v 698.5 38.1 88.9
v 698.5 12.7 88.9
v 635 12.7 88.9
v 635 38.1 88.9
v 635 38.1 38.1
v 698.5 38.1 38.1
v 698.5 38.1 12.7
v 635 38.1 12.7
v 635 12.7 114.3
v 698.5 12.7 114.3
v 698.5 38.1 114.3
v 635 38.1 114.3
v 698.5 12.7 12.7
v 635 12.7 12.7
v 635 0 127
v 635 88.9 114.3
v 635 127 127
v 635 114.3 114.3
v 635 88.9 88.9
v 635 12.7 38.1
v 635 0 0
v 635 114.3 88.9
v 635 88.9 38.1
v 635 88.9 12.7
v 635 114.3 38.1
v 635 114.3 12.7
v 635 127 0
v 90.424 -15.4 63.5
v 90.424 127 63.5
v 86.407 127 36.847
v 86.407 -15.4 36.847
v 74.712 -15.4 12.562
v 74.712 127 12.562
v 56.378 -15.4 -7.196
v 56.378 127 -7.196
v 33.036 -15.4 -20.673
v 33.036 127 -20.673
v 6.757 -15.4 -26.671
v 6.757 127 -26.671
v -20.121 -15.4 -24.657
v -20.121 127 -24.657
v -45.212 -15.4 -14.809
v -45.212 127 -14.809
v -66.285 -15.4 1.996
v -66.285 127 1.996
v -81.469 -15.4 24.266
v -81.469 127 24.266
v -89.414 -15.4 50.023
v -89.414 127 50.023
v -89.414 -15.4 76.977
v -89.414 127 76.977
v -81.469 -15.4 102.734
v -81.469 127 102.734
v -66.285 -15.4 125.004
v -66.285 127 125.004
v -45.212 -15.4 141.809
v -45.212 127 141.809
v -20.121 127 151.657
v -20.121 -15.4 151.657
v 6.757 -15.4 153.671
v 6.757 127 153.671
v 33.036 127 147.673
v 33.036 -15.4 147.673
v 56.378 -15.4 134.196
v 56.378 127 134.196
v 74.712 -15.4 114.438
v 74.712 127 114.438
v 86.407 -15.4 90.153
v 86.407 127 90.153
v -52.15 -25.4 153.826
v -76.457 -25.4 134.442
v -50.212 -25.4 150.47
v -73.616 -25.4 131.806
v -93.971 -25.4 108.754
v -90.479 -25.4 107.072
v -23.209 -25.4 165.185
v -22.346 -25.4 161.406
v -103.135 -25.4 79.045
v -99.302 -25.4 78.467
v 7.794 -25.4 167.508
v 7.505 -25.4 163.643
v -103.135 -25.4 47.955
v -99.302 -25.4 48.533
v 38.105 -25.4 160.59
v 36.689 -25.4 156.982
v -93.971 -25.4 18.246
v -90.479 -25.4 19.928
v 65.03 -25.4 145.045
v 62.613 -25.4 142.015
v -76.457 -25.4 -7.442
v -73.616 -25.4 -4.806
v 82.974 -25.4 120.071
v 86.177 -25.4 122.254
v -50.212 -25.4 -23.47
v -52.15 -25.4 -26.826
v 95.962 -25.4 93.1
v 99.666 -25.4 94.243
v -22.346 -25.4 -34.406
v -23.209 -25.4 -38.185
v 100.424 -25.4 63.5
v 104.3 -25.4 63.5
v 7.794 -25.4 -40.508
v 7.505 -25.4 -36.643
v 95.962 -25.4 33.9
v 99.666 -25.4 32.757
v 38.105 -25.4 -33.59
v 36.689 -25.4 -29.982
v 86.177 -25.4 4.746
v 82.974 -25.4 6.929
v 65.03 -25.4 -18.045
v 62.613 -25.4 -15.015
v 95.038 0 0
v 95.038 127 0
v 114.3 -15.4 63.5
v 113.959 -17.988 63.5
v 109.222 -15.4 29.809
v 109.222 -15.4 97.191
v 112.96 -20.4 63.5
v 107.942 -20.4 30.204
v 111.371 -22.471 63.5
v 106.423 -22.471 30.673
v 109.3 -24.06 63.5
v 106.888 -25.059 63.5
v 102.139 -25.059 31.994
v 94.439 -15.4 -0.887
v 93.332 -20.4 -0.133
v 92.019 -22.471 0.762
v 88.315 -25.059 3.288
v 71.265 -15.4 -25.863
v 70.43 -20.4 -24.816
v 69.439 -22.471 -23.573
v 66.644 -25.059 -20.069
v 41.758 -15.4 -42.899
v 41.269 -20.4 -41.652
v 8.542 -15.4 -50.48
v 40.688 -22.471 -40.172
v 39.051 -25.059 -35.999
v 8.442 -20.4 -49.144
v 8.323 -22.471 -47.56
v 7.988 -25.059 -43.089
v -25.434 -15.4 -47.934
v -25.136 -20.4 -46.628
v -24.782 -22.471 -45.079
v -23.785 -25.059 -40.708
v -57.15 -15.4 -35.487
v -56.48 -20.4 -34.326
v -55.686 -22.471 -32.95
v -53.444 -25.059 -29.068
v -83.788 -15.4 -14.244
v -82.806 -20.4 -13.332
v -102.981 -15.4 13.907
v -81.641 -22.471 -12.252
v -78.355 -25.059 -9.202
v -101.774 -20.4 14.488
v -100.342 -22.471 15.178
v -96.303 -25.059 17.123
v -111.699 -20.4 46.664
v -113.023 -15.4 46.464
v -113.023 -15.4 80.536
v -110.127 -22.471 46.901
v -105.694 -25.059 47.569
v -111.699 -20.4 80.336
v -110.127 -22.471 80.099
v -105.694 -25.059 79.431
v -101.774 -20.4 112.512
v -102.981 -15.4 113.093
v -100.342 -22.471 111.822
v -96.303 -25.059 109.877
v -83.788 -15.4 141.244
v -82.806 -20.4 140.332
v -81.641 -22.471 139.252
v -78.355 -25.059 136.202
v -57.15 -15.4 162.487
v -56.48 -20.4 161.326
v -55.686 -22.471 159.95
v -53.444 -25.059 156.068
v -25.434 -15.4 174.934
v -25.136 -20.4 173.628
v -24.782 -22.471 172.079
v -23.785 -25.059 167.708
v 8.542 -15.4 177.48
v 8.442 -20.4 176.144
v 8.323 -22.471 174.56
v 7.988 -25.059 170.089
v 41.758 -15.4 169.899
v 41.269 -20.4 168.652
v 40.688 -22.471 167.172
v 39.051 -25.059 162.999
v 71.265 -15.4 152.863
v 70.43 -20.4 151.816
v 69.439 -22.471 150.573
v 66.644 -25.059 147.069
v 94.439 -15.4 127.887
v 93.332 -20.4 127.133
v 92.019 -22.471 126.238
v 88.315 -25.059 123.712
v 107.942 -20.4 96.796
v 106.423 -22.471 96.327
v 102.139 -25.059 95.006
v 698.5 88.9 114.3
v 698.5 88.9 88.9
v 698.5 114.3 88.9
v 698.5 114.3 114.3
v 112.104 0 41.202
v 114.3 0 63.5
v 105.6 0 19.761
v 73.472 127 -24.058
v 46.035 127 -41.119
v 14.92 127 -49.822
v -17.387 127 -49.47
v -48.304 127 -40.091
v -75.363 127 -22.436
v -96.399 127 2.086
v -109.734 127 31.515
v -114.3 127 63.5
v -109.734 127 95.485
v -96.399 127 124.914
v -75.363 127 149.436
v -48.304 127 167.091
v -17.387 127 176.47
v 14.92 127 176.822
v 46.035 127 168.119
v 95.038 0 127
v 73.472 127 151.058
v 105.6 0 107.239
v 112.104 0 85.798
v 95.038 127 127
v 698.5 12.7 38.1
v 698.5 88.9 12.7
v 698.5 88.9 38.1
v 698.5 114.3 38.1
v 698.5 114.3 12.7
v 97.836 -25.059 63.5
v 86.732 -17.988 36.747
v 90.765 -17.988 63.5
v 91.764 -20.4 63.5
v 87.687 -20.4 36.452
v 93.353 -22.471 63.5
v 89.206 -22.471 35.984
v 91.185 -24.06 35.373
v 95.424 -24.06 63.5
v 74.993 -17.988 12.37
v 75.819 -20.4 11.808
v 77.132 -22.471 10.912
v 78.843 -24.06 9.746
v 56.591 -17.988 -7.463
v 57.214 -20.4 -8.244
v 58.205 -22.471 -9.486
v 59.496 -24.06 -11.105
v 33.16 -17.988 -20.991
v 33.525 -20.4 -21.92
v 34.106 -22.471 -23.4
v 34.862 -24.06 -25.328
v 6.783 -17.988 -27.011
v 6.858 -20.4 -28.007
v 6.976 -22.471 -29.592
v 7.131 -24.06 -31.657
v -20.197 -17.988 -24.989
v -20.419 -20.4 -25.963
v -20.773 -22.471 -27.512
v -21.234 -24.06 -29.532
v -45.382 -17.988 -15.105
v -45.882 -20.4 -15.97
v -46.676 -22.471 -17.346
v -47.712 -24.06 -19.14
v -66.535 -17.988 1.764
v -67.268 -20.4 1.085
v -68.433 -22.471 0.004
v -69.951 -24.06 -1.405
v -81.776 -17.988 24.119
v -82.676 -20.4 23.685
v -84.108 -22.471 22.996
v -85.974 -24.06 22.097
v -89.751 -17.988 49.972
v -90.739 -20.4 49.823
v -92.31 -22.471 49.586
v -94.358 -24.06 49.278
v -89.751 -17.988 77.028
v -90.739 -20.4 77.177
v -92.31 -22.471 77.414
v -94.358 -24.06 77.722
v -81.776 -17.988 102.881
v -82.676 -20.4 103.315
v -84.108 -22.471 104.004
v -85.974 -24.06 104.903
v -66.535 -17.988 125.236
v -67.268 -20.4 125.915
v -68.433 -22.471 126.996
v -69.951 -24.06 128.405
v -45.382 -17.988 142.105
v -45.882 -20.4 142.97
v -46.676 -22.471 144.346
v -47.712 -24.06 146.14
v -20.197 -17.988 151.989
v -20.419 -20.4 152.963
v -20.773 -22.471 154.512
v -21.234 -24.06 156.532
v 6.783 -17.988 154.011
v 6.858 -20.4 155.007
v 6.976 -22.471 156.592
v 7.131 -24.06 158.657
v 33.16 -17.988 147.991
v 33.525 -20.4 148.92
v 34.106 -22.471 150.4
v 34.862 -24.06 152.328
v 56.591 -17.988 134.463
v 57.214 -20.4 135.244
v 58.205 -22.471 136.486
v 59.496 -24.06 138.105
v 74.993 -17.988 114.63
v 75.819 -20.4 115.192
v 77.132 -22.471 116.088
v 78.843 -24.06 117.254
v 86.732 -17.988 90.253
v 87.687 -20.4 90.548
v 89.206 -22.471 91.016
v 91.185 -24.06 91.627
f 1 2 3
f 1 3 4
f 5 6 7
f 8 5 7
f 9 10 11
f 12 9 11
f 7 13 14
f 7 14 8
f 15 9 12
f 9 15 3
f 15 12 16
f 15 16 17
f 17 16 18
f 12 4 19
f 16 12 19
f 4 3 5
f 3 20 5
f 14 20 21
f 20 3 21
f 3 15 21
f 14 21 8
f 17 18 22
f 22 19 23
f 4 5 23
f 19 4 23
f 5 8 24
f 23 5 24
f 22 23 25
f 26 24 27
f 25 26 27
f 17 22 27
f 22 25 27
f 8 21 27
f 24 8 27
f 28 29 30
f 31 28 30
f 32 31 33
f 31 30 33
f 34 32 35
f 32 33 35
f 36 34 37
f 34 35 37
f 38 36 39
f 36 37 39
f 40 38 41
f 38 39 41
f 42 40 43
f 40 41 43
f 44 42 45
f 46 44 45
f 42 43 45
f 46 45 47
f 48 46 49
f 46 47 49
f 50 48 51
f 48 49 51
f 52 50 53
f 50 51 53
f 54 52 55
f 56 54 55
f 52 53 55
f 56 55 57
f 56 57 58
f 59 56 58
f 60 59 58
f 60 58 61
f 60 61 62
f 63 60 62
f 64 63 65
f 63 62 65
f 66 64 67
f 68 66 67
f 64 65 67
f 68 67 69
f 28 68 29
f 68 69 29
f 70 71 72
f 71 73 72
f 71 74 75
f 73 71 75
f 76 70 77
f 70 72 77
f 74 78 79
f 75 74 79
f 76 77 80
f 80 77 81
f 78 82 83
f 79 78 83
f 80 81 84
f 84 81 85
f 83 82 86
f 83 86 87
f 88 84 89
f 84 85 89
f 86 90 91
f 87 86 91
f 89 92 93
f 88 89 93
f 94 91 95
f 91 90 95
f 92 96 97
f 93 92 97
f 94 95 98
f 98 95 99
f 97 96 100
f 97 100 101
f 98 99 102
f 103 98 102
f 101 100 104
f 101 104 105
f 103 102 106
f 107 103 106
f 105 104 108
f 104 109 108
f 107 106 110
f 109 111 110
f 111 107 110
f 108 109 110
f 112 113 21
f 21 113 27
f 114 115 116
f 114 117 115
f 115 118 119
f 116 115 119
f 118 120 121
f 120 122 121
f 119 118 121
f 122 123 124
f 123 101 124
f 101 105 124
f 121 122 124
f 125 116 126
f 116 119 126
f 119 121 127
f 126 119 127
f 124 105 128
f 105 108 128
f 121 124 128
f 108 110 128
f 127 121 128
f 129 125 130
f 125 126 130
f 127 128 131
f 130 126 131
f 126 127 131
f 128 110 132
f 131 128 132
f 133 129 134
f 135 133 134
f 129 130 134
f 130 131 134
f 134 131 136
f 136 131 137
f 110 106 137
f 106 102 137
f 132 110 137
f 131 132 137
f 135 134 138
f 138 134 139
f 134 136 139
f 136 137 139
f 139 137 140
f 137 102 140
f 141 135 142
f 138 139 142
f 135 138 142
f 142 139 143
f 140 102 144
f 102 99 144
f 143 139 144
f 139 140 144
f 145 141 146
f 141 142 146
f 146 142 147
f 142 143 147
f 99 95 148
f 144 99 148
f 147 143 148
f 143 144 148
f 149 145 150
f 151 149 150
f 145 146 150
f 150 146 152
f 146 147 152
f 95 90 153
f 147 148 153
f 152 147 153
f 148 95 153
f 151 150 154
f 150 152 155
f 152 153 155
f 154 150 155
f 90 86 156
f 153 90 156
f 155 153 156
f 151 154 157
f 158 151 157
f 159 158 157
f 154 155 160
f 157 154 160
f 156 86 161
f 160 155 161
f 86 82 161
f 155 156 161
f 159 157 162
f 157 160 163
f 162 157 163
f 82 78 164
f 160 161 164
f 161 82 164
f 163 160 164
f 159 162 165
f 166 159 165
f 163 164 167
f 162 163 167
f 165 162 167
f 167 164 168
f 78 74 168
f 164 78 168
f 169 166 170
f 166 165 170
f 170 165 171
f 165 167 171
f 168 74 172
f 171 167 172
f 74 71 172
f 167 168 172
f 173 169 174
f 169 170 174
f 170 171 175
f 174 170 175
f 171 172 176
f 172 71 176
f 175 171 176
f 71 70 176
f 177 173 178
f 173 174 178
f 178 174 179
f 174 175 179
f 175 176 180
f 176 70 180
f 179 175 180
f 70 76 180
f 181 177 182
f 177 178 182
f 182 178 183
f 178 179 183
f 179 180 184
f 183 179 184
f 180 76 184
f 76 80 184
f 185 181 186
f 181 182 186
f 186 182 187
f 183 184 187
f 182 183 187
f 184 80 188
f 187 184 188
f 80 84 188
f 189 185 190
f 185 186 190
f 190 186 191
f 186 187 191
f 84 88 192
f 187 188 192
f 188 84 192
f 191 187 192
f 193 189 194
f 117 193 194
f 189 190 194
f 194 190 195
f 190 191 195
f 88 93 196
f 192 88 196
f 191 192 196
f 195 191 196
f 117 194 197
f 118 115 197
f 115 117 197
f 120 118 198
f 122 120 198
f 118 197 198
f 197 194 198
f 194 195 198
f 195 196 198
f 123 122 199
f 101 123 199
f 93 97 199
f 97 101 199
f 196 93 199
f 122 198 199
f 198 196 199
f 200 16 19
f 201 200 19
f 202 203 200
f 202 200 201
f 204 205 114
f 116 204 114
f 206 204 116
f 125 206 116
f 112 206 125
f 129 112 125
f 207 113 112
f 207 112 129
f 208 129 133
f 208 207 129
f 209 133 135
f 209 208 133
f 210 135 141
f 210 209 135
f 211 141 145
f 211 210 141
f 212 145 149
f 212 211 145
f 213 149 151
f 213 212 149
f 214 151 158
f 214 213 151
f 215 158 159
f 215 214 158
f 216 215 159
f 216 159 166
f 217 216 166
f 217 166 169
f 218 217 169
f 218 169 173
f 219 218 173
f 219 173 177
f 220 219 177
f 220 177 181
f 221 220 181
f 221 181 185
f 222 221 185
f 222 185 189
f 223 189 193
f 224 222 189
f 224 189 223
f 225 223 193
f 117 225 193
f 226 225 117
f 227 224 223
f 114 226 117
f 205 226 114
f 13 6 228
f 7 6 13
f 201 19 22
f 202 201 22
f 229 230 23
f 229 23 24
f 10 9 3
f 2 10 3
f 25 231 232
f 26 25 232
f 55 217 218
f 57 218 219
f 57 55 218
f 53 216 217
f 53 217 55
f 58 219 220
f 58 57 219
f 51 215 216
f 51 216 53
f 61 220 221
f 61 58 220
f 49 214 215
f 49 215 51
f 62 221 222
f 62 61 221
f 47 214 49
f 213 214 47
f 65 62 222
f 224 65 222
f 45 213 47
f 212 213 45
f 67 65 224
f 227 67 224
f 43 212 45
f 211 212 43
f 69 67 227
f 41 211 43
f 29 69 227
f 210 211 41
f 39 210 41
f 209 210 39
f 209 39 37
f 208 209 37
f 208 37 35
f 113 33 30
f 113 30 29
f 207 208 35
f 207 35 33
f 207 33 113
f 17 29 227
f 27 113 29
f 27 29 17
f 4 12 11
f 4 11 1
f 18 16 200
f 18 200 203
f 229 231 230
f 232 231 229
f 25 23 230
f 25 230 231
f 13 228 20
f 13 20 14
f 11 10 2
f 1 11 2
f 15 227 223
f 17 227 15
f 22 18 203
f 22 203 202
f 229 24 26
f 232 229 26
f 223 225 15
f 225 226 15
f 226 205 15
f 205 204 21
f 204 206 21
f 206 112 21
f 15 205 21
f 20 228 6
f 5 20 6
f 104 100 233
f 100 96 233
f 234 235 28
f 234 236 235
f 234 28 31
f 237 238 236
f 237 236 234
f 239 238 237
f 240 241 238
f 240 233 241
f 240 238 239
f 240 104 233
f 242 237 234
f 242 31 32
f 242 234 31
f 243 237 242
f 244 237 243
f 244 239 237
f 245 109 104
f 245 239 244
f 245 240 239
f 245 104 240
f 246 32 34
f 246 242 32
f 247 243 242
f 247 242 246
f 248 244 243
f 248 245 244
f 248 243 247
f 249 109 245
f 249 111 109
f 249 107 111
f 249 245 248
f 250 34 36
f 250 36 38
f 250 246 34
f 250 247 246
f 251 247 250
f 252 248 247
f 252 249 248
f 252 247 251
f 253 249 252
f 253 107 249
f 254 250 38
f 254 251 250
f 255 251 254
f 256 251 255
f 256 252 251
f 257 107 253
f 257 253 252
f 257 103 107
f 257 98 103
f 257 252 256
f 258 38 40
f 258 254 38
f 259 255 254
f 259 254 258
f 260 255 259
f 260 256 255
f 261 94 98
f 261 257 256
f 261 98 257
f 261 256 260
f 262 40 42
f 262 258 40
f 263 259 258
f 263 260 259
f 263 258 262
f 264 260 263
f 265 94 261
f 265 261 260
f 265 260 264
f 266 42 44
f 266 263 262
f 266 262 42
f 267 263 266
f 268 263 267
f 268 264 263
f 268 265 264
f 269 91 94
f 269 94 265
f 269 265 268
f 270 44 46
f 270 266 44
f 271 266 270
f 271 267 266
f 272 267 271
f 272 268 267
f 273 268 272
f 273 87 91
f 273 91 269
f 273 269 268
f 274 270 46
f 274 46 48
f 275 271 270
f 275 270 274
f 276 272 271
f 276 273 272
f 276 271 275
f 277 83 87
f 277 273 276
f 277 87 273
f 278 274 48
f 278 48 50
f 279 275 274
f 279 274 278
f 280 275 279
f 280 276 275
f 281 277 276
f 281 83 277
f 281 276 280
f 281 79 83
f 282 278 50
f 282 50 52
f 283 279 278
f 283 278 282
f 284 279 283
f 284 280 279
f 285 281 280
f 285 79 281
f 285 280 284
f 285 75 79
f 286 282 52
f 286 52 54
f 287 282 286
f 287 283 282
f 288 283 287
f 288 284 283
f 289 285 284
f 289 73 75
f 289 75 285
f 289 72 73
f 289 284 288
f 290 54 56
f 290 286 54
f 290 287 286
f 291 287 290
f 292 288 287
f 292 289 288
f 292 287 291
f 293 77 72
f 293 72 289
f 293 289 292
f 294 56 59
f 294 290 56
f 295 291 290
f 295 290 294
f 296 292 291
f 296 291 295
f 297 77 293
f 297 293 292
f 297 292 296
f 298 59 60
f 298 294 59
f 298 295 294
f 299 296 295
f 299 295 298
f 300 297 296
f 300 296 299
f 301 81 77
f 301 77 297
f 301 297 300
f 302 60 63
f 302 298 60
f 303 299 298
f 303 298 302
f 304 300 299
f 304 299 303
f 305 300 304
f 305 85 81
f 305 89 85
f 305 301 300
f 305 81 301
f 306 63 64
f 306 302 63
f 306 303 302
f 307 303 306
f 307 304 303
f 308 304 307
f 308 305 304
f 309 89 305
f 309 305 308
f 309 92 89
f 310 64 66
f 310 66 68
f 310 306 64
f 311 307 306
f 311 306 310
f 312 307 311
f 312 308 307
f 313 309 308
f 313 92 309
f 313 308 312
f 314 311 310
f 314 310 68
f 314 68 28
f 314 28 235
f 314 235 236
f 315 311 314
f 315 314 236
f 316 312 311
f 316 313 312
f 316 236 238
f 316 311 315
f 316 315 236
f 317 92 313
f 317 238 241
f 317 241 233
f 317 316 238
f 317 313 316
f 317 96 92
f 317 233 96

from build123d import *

# Parameters (mm, degrees)
SKETCH2_W               = 635
SKETCH2_H               = 127
BOSS_EXTRUDE1_DEPTH     = 127
SKETCH3_R               = 114.3
SKETCH3_R_2             = 90.424
BOSS_EXTRUDE2_DEPTH     = 152.4
SKETCH4_R               = 90.424
CUT_EXTRUDE2_DEPTH      = 1
CUT_EXTRUDE2_DEPTH_BACK = 153.4
SKETCH5_W               = 25.4
SKETCH5_H               = 25.4
BOSS_EXTRUDE3_DEPTH     = 63.5
FILLET1_R               = 10


with BuildPart() as part:
    # Sketch2 → Boss-Extrude1 (new body)
    with BuildSketch(Plane.XY):
        with Locations((317.5, 63.5)):
            Rectangle(SKETCH2_W, SKETCH2_H)
    extrude(amount=BOSS_EXTRUDE1_DEPTH)

    # Sketch3 → Boss-Extrude2 (add)
    with BuildSketch(Plane(origin=(0, 127, 0), x_dir=(1, 0, 0), z_dir=(0, 1, 0))):
        with Locations((0, -63.5)):
            Circle(SKETCH3_R)
        with Locations((0, -63.5)):
            Circle(SKETCH3_R_2, mode=Mode.SUBTRACT)
    extrude(amount=-BOSS_EXTRUDE2_DEPTH)

    # Sketch4 → Cut-Extrude2 (cut, two sides)
    with BuildSketch(Plane(origin=(0, 127, 0), x_dir=(1, 0, 0), z_dir=(0, 1, 0))) as cut_extrude2_sk:
        with Locations((0, -63.5)):
            Circle(SKETCH4_R)
    extrude(amount=CUT_EXTRUDE2_DEPTH, mode=Mode.SUBTRACT)
    extrude(cut_extrude2_sk.sketch, amount=-CUT_EXTRUDE2_DEPTH_BACK, mode=Mode.SUBTRACT)

    # Sketch5 → Boss-Extrude3 (add)
    with BuildSketch(Plane(origin=(635, 0, 0), x_dir=(0, 0, -1), z_dir=(1, 0, 0))):
        with Locations((-101.6, 101.6)):
            Rectangle(SKETCH5_W, SKETCH5_H)
        with Locations((-25.4, 25.4)):
            Rectangle(SKETCH5_W, SKETCH5_H)
        with Locations((-101.6, 25.4)):
            Rectangle(SKETCH5_W, SKETCH5_H)
        with Locations((-25.4, 101.6)):
            Rectangle(SKETCH5_W, SKETCH5_H)
    extrude(amount=BOSS_EXTRUDE3_DEPTH)

    # Fillet1
    fillet1_edges = [part.edges().sort_by_distance(p)[0] for p in [
        (-114.3, -25.4, 63.5),
        (-90.424, -25.4, 63.5),
    ]]
    fillet(fillet1_edges, radius=FILLET1_R)


solid = part.part
